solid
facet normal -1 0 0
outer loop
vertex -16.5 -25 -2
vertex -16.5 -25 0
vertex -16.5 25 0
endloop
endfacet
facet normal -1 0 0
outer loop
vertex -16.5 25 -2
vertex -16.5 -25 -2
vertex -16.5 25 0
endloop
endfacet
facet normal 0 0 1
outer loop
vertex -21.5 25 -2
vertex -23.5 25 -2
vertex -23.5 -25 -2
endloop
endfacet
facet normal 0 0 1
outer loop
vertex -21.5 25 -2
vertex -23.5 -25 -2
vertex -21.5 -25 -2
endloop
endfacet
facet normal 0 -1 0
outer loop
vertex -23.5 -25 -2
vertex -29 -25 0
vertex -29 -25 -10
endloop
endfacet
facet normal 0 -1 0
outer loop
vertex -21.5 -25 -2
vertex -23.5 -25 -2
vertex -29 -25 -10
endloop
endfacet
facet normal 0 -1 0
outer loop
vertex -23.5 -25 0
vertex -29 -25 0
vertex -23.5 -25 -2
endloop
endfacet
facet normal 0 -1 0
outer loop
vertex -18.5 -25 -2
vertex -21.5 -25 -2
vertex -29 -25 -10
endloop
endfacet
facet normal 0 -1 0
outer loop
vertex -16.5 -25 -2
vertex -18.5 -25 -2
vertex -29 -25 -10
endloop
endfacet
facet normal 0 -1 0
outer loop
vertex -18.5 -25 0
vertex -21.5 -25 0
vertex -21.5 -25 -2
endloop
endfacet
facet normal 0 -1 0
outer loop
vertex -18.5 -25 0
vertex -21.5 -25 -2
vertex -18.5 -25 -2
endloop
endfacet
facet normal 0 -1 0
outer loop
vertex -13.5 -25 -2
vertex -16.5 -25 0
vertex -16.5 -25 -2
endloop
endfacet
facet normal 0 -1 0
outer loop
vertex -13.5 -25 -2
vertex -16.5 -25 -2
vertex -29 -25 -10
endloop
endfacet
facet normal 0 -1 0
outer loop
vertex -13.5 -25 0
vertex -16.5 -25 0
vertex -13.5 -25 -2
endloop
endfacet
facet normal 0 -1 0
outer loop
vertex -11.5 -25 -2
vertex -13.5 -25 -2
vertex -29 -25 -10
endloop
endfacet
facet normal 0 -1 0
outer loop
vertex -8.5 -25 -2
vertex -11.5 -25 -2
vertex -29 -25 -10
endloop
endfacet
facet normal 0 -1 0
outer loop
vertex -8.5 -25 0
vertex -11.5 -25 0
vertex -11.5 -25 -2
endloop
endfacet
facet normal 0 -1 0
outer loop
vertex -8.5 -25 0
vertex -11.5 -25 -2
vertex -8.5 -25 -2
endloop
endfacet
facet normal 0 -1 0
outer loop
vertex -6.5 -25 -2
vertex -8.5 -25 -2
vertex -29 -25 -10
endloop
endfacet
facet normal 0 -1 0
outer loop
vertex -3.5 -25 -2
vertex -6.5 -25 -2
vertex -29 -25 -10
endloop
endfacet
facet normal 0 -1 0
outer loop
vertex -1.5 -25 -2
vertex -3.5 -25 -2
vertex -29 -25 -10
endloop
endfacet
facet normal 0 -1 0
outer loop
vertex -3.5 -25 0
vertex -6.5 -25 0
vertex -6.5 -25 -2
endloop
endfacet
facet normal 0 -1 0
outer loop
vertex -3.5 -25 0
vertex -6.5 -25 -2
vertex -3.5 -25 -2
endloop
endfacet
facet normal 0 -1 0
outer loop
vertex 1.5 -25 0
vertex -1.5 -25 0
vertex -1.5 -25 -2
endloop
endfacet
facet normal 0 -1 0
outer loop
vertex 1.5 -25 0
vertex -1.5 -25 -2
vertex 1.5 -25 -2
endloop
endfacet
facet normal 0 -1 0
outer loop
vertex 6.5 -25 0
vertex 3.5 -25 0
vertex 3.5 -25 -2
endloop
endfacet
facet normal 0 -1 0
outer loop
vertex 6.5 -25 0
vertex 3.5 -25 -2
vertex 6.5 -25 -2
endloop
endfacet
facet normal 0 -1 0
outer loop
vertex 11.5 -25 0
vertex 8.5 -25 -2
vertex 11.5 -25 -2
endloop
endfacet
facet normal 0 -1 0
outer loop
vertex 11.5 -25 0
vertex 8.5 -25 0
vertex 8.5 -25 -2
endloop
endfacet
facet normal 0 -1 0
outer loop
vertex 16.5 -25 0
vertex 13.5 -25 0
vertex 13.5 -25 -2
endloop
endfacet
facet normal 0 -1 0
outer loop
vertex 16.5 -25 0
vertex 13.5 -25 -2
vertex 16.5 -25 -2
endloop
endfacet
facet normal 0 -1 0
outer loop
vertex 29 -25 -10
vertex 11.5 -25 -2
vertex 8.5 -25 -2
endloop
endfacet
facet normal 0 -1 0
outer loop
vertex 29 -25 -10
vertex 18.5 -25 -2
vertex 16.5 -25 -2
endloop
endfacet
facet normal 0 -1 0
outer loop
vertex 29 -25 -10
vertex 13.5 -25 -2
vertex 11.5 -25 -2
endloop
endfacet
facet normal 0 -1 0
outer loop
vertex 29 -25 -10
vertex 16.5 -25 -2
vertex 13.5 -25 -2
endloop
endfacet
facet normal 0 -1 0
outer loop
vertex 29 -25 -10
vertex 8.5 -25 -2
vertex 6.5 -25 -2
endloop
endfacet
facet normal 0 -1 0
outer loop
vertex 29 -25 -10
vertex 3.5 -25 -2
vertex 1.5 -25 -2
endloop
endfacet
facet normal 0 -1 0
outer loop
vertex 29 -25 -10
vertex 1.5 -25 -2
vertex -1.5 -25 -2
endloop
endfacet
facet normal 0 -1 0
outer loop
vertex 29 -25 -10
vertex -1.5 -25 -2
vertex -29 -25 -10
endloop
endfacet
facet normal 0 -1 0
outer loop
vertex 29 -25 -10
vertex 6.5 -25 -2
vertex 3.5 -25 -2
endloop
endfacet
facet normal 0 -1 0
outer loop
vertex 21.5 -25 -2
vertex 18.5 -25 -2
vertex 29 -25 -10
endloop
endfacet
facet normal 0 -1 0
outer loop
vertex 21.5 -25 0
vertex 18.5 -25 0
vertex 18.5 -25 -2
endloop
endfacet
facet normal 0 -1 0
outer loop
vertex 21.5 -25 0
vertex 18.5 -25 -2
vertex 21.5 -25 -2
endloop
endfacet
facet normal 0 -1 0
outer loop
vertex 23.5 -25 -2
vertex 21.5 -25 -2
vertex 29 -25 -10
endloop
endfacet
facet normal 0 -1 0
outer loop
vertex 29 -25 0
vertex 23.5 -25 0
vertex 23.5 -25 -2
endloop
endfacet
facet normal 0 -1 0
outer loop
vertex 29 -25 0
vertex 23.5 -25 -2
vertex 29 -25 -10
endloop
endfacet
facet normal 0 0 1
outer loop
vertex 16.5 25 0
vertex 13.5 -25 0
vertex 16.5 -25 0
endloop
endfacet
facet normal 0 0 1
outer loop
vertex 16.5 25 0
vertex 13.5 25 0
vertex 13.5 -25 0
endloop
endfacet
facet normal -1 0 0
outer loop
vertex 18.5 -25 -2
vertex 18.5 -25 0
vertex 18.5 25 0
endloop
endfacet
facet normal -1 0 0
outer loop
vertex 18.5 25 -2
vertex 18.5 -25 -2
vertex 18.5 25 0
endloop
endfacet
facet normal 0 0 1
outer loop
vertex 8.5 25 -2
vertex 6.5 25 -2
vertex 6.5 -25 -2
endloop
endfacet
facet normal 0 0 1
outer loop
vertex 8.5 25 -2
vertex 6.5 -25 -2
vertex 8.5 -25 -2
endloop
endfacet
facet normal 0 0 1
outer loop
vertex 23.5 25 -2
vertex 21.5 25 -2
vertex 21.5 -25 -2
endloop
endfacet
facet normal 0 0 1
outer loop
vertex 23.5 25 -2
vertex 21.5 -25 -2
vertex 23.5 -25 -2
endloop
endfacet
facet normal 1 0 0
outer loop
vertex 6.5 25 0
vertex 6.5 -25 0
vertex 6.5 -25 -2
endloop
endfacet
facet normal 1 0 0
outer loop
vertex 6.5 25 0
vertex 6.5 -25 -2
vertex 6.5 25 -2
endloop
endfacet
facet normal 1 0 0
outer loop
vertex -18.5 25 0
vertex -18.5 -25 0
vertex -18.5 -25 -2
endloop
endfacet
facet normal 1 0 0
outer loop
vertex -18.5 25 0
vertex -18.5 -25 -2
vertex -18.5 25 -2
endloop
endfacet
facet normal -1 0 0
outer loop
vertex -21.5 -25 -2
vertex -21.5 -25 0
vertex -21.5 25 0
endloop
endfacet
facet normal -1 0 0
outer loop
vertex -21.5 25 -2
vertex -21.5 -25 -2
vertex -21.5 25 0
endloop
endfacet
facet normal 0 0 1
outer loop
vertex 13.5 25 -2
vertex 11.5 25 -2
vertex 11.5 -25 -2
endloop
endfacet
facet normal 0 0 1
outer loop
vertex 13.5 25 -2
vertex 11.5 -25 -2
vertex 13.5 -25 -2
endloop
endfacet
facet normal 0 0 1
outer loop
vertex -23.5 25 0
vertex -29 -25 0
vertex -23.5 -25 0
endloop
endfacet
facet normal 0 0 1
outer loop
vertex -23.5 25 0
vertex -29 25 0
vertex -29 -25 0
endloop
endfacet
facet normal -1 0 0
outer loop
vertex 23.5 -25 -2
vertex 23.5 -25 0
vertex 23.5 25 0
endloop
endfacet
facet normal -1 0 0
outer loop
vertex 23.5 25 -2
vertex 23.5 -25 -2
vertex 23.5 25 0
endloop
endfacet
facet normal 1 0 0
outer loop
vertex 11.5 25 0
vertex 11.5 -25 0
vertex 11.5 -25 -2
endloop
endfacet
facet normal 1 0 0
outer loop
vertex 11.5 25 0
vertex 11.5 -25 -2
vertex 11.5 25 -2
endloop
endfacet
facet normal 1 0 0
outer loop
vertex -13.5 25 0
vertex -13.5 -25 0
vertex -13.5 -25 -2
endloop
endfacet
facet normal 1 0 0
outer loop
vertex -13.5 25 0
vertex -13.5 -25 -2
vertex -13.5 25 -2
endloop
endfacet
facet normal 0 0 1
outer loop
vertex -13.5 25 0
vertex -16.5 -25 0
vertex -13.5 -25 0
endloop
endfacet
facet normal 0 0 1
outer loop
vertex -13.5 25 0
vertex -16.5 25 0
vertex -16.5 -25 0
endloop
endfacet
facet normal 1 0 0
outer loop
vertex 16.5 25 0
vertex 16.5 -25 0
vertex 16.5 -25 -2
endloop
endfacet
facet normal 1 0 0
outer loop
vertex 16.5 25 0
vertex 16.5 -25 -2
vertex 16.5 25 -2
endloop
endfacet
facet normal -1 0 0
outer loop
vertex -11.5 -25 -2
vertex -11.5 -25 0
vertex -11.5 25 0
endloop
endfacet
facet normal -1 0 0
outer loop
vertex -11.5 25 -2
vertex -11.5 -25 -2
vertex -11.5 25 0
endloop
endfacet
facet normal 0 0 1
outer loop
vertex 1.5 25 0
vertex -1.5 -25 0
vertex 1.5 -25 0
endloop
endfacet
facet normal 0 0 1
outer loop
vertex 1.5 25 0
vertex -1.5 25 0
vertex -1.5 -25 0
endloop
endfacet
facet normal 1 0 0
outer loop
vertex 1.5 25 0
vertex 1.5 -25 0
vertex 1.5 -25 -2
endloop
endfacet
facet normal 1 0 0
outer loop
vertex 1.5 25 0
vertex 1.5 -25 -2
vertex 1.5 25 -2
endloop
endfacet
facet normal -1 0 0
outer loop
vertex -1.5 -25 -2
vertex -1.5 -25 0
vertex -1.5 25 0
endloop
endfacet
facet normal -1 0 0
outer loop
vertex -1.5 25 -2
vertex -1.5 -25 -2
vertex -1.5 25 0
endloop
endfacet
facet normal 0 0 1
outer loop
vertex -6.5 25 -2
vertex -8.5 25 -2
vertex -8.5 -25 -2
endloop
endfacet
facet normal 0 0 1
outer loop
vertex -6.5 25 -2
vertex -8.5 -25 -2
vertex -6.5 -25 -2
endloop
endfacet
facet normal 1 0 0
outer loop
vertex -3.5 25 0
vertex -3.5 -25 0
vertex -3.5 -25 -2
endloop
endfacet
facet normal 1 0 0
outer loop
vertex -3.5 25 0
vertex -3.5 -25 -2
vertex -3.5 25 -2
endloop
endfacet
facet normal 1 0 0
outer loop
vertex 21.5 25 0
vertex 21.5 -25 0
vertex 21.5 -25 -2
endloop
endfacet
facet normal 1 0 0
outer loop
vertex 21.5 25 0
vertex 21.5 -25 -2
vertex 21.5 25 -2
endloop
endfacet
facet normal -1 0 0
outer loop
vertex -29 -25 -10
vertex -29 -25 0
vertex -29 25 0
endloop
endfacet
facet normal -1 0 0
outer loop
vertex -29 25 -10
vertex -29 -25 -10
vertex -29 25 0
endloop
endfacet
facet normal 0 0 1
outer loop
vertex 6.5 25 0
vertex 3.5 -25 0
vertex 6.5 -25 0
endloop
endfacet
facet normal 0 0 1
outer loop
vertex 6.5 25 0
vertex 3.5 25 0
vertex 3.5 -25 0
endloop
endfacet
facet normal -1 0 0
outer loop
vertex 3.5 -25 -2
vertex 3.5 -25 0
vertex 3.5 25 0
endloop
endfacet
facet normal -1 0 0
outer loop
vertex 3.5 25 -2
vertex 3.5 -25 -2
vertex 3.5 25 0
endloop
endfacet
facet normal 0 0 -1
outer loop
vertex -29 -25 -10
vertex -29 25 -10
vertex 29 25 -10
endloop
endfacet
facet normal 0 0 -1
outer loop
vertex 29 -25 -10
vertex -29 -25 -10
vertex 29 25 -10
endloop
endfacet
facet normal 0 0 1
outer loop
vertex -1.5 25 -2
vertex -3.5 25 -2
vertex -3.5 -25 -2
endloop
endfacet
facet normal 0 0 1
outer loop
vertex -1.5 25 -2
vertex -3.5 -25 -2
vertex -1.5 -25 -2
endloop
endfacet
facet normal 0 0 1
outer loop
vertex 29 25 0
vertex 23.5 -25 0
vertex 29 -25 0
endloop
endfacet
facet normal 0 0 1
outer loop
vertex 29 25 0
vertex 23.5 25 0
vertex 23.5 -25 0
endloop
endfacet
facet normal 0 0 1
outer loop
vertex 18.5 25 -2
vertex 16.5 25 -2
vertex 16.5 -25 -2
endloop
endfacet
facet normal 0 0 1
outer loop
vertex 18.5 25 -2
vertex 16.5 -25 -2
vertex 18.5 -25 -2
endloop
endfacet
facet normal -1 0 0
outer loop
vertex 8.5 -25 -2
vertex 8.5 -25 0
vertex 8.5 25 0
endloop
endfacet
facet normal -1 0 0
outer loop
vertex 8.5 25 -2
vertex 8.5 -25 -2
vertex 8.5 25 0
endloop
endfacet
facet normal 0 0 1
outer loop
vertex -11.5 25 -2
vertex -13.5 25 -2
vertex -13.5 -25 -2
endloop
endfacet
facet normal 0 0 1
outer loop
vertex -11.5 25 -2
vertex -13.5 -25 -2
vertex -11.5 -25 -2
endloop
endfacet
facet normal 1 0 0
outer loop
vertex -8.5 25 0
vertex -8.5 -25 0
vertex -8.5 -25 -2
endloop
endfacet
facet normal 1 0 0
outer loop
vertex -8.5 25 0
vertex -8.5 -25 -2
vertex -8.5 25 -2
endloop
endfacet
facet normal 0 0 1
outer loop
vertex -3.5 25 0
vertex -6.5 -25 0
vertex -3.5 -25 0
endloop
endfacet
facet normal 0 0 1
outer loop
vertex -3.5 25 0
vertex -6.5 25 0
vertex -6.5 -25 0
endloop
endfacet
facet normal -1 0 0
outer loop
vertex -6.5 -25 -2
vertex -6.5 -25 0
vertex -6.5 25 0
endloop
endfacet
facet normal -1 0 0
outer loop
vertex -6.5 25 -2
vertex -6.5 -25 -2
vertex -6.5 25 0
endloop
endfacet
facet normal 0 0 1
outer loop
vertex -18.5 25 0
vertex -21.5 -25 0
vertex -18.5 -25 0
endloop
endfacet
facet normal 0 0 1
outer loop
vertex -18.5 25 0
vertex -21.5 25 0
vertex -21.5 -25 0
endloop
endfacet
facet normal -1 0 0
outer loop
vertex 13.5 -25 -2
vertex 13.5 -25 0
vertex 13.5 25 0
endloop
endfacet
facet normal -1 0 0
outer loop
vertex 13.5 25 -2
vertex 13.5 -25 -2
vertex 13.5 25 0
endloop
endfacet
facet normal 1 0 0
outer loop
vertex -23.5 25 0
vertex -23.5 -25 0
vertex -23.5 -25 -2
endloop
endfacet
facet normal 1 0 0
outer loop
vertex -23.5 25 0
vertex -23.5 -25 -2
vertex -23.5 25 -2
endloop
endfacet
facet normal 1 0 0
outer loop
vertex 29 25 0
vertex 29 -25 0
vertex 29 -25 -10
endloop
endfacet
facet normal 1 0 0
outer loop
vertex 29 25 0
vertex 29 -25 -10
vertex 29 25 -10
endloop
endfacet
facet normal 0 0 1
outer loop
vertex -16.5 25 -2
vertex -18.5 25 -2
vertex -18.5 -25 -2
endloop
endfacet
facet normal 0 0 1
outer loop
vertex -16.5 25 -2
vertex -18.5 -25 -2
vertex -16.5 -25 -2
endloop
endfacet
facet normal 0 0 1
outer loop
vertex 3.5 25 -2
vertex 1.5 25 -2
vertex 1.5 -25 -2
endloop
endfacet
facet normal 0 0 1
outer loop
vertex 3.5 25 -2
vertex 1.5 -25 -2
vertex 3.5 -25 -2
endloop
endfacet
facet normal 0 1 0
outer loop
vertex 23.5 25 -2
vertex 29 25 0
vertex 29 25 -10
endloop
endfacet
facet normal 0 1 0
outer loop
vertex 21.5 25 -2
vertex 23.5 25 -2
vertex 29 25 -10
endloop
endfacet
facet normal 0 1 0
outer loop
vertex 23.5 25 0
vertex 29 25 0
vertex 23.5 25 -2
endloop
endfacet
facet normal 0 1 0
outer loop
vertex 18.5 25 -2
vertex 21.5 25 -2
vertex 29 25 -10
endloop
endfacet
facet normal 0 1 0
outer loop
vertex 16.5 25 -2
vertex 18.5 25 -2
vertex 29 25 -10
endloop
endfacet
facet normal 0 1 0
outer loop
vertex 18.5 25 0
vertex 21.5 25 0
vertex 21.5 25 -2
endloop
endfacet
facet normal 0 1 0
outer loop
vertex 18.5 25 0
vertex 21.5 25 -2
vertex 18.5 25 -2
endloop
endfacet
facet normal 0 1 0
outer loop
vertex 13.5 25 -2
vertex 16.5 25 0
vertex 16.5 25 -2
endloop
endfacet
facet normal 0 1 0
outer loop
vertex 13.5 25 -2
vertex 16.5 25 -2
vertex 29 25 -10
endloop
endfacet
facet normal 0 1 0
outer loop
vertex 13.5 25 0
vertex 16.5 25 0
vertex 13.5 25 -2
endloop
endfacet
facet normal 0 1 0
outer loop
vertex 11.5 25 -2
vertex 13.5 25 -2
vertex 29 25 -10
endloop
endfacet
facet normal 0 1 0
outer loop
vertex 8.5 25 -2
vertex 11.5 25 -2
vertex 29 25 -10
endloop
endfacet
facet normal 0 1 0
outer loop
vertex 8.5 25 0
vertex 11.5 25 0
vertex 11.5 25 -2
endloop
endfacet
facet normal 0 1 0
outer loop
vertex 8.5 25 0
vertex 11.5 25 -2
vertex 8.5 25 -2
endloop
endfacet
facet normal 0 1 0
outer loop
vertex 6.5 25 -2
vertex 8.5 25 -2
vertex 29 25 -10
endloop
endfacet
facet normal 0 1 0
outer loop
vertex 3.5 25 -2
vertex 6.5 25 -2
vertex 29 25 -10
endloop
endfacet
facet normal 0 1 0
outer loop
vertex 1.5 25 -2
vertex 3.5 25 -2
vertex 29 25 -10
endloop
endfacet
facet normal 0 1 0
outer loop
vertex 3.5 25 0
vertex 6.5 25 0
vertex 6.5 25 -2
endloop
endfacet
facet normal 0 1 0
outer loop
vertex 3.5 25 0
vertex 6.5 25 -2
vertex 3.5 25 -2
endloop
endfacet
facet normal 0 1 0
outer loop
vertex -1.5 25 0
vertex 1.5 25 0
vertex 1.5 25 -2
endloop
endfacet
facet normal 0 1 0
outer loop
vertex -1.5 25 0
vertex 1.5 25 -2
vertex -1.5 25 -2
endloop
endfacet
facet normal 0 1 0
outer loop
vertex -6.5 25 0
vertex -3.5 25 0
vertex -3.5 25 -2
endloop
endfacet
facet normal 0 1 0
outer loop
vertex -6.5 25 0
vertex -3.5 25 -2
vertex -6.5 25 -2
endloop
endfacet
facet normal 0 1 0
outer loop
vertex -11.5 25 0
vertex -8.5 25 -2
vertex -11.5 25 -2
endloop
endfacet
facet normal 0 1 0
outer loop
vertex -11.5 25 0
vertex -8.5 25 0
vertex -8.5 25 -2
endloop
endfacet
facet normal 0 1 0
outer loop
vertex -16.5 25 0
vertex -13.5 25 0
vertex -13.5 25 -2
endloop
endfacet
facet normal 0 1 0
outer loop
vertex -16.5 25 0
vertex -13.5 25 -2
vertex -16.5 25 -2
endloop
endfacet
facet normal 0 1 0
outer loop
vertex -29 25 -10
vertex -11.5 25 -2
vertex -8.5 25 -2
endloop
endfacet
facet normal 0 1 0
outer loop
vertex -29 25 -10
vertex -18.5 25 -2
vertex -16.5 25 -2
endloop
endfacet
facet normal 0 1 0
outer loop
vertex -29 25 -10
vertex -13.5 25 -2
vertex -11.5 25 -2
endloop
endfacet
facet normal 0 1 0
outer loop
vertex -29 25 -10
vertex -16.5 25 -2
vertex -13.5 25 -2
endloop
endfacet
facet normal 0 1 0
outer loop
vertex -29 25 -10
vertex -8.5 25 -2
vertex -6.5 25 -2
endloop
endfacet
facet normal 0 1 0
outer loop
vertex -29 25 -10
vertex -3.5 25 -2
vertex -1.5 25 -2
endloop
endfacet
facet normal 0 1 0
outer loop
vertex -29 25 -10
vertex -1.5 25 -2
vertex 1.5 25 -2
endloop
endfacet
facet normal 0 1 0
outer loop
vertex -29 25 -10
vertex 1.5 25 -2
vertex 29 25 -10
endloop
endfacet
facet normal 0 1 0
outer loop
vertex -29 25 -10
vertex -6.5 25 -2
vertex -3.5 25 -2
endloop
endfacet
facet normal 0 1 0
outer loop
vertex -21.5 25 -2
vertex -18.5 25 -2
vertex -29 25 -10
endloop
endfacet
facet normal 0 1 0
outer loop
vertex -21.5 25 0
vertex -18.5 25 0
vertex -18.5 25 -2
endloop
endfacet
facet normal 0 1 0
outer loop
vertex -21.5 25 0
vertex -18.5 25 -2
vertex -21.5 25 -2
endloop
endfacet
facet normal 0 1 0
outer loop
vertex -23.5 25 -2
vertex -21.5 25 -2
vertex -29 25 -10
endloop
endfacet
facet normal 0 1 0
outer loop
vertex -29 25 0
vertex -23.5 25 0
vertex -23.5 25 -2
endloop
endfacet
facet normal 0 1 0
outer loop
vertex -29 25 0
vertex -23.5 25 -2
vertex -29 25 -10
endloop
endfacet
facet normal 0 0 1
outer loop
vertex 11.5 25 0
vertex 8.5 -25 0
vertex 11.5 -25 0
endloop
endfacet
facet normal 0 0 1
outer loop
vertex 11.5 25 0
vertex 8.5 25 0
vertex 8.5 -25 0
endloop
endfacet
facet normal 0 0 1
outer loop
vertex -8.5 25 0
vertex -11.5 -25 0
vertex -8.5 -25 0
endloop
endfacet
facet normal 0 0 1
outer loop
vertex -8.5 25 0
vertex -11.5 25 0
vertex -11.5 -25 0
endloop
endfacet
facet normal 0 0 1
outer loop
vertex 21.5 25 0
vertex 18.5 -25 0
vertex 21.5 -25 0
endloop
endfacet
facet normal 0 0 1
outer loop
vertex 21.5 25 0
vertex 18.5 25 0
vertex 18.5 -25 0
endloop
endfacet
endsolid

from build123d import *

# Parameters (mm, degrees)
F0_W     = 5.5
F0_H     = 50
F0_W_2   = 2
F0_W_3   = 3
F1_DEPTH = 10
F2_DEPTH = 2


with BuildPart() as f1:
    # F0 (on Top) → F1 (new body)
    with BuildSketch(Plane.XY):
        with Locations((26.25, 0)):
            Rectangle(F0_W, F0_H)
        with Locations((22.5, 0)):
            Rectangle(F0_W_2, F0_H)
        with Locations((20, 0)):
            Rectangle(F0_W_3, F0_H)
        with Locations((17.5, 0)):
            Rectangle(F0_W_2, F0_H)
        with Locations((15, 0)):
            Rectangle(F0_W_3, F0_H)
        with Locations((12.5, 0)):
            Rectangle(F0_W_2, F0_H)
        with Locations((10, 0)):
            Rectangle(F0_W_3, F0_H)
        with Locations((7.5, 0)):
            Rectangle(F0_W_2, F0_H)
        with Locations((5, 0)):
            Rectangle(F0_W_3, F0_H)
        with Locations((2.5, 0)):
            Rectangle(F0_W_2, F0_H)
        Rectangle(F0_W_3, F0_H)
        with Locations((-2.5, 0)):
            Rectangle(F0_W_2, F0_H)
        with Locations((-5, 0)):
            Rectangle(F0_W_3, F0_H)
        with Locations((-7.5, 0)):
            Rectangle(F0_W_2, F0_H)
        with Locations((-10, 0)):
            Rectangle(F0_W_3, F0_H)
        with Locations((-12.5, 0)):
            Rectangle(F0_W_2, F0_H)
        with Locations((-15, 0)):
            Rectangle(F0_W_3, F0_H)
        with Locations((-17.5, 0)):
            Rectangle(F0_W_2, F0_H)
        with Locations((-20, 0)):
            Rectangle(F0_W_3, F0_H)
        with Locations((-22.5, 0)):
            Rectangle(F0_W_2, F0_H)
        with Locations((-26.25, 0)):
            Rectangle(F0_W, F0_H)
    extrude(amount=-F1_DEPTH)

    # F0 (on Top) → F2 (cut)
    with BuildSketch(Plane.XY):
        with Locations((-22.5, 0)):
            Rectangle(F0_W_2, F0_H)
        with Locations((-17.5, 0)):
            Rectangle(F0_W_2, F0_H)
        with Locations((-12.5, 0)):
            Rectangle(F0_W_2, F0_H)
        with Locations((-7.5, 0)):
            Rectangle(F0_W_2, F0_H)
        with Locations((-2.5, 0)):
            Rectangle(F0_W_2, F0_H)
        with Locations((2.5, 0)):
            Rectangle(F0_W_2, F0_H)
        with Locations((7.5, 0)):
            Rectangle(F0_W_2, F0_H)
        with Locations((12.5, 0)):
            Rectangle(F0_W_2, F0_H)
        with Locations((17.5, 0)):
            Rectangle(F0_W_2, F0_H)
        with Locations((22.5, 0)):
            Rectangle(F0_W_2, F0_H)
    extrude(amount=-F2_DEPTH, mode=Mode.SUBTRACT)


solid = f1.part
